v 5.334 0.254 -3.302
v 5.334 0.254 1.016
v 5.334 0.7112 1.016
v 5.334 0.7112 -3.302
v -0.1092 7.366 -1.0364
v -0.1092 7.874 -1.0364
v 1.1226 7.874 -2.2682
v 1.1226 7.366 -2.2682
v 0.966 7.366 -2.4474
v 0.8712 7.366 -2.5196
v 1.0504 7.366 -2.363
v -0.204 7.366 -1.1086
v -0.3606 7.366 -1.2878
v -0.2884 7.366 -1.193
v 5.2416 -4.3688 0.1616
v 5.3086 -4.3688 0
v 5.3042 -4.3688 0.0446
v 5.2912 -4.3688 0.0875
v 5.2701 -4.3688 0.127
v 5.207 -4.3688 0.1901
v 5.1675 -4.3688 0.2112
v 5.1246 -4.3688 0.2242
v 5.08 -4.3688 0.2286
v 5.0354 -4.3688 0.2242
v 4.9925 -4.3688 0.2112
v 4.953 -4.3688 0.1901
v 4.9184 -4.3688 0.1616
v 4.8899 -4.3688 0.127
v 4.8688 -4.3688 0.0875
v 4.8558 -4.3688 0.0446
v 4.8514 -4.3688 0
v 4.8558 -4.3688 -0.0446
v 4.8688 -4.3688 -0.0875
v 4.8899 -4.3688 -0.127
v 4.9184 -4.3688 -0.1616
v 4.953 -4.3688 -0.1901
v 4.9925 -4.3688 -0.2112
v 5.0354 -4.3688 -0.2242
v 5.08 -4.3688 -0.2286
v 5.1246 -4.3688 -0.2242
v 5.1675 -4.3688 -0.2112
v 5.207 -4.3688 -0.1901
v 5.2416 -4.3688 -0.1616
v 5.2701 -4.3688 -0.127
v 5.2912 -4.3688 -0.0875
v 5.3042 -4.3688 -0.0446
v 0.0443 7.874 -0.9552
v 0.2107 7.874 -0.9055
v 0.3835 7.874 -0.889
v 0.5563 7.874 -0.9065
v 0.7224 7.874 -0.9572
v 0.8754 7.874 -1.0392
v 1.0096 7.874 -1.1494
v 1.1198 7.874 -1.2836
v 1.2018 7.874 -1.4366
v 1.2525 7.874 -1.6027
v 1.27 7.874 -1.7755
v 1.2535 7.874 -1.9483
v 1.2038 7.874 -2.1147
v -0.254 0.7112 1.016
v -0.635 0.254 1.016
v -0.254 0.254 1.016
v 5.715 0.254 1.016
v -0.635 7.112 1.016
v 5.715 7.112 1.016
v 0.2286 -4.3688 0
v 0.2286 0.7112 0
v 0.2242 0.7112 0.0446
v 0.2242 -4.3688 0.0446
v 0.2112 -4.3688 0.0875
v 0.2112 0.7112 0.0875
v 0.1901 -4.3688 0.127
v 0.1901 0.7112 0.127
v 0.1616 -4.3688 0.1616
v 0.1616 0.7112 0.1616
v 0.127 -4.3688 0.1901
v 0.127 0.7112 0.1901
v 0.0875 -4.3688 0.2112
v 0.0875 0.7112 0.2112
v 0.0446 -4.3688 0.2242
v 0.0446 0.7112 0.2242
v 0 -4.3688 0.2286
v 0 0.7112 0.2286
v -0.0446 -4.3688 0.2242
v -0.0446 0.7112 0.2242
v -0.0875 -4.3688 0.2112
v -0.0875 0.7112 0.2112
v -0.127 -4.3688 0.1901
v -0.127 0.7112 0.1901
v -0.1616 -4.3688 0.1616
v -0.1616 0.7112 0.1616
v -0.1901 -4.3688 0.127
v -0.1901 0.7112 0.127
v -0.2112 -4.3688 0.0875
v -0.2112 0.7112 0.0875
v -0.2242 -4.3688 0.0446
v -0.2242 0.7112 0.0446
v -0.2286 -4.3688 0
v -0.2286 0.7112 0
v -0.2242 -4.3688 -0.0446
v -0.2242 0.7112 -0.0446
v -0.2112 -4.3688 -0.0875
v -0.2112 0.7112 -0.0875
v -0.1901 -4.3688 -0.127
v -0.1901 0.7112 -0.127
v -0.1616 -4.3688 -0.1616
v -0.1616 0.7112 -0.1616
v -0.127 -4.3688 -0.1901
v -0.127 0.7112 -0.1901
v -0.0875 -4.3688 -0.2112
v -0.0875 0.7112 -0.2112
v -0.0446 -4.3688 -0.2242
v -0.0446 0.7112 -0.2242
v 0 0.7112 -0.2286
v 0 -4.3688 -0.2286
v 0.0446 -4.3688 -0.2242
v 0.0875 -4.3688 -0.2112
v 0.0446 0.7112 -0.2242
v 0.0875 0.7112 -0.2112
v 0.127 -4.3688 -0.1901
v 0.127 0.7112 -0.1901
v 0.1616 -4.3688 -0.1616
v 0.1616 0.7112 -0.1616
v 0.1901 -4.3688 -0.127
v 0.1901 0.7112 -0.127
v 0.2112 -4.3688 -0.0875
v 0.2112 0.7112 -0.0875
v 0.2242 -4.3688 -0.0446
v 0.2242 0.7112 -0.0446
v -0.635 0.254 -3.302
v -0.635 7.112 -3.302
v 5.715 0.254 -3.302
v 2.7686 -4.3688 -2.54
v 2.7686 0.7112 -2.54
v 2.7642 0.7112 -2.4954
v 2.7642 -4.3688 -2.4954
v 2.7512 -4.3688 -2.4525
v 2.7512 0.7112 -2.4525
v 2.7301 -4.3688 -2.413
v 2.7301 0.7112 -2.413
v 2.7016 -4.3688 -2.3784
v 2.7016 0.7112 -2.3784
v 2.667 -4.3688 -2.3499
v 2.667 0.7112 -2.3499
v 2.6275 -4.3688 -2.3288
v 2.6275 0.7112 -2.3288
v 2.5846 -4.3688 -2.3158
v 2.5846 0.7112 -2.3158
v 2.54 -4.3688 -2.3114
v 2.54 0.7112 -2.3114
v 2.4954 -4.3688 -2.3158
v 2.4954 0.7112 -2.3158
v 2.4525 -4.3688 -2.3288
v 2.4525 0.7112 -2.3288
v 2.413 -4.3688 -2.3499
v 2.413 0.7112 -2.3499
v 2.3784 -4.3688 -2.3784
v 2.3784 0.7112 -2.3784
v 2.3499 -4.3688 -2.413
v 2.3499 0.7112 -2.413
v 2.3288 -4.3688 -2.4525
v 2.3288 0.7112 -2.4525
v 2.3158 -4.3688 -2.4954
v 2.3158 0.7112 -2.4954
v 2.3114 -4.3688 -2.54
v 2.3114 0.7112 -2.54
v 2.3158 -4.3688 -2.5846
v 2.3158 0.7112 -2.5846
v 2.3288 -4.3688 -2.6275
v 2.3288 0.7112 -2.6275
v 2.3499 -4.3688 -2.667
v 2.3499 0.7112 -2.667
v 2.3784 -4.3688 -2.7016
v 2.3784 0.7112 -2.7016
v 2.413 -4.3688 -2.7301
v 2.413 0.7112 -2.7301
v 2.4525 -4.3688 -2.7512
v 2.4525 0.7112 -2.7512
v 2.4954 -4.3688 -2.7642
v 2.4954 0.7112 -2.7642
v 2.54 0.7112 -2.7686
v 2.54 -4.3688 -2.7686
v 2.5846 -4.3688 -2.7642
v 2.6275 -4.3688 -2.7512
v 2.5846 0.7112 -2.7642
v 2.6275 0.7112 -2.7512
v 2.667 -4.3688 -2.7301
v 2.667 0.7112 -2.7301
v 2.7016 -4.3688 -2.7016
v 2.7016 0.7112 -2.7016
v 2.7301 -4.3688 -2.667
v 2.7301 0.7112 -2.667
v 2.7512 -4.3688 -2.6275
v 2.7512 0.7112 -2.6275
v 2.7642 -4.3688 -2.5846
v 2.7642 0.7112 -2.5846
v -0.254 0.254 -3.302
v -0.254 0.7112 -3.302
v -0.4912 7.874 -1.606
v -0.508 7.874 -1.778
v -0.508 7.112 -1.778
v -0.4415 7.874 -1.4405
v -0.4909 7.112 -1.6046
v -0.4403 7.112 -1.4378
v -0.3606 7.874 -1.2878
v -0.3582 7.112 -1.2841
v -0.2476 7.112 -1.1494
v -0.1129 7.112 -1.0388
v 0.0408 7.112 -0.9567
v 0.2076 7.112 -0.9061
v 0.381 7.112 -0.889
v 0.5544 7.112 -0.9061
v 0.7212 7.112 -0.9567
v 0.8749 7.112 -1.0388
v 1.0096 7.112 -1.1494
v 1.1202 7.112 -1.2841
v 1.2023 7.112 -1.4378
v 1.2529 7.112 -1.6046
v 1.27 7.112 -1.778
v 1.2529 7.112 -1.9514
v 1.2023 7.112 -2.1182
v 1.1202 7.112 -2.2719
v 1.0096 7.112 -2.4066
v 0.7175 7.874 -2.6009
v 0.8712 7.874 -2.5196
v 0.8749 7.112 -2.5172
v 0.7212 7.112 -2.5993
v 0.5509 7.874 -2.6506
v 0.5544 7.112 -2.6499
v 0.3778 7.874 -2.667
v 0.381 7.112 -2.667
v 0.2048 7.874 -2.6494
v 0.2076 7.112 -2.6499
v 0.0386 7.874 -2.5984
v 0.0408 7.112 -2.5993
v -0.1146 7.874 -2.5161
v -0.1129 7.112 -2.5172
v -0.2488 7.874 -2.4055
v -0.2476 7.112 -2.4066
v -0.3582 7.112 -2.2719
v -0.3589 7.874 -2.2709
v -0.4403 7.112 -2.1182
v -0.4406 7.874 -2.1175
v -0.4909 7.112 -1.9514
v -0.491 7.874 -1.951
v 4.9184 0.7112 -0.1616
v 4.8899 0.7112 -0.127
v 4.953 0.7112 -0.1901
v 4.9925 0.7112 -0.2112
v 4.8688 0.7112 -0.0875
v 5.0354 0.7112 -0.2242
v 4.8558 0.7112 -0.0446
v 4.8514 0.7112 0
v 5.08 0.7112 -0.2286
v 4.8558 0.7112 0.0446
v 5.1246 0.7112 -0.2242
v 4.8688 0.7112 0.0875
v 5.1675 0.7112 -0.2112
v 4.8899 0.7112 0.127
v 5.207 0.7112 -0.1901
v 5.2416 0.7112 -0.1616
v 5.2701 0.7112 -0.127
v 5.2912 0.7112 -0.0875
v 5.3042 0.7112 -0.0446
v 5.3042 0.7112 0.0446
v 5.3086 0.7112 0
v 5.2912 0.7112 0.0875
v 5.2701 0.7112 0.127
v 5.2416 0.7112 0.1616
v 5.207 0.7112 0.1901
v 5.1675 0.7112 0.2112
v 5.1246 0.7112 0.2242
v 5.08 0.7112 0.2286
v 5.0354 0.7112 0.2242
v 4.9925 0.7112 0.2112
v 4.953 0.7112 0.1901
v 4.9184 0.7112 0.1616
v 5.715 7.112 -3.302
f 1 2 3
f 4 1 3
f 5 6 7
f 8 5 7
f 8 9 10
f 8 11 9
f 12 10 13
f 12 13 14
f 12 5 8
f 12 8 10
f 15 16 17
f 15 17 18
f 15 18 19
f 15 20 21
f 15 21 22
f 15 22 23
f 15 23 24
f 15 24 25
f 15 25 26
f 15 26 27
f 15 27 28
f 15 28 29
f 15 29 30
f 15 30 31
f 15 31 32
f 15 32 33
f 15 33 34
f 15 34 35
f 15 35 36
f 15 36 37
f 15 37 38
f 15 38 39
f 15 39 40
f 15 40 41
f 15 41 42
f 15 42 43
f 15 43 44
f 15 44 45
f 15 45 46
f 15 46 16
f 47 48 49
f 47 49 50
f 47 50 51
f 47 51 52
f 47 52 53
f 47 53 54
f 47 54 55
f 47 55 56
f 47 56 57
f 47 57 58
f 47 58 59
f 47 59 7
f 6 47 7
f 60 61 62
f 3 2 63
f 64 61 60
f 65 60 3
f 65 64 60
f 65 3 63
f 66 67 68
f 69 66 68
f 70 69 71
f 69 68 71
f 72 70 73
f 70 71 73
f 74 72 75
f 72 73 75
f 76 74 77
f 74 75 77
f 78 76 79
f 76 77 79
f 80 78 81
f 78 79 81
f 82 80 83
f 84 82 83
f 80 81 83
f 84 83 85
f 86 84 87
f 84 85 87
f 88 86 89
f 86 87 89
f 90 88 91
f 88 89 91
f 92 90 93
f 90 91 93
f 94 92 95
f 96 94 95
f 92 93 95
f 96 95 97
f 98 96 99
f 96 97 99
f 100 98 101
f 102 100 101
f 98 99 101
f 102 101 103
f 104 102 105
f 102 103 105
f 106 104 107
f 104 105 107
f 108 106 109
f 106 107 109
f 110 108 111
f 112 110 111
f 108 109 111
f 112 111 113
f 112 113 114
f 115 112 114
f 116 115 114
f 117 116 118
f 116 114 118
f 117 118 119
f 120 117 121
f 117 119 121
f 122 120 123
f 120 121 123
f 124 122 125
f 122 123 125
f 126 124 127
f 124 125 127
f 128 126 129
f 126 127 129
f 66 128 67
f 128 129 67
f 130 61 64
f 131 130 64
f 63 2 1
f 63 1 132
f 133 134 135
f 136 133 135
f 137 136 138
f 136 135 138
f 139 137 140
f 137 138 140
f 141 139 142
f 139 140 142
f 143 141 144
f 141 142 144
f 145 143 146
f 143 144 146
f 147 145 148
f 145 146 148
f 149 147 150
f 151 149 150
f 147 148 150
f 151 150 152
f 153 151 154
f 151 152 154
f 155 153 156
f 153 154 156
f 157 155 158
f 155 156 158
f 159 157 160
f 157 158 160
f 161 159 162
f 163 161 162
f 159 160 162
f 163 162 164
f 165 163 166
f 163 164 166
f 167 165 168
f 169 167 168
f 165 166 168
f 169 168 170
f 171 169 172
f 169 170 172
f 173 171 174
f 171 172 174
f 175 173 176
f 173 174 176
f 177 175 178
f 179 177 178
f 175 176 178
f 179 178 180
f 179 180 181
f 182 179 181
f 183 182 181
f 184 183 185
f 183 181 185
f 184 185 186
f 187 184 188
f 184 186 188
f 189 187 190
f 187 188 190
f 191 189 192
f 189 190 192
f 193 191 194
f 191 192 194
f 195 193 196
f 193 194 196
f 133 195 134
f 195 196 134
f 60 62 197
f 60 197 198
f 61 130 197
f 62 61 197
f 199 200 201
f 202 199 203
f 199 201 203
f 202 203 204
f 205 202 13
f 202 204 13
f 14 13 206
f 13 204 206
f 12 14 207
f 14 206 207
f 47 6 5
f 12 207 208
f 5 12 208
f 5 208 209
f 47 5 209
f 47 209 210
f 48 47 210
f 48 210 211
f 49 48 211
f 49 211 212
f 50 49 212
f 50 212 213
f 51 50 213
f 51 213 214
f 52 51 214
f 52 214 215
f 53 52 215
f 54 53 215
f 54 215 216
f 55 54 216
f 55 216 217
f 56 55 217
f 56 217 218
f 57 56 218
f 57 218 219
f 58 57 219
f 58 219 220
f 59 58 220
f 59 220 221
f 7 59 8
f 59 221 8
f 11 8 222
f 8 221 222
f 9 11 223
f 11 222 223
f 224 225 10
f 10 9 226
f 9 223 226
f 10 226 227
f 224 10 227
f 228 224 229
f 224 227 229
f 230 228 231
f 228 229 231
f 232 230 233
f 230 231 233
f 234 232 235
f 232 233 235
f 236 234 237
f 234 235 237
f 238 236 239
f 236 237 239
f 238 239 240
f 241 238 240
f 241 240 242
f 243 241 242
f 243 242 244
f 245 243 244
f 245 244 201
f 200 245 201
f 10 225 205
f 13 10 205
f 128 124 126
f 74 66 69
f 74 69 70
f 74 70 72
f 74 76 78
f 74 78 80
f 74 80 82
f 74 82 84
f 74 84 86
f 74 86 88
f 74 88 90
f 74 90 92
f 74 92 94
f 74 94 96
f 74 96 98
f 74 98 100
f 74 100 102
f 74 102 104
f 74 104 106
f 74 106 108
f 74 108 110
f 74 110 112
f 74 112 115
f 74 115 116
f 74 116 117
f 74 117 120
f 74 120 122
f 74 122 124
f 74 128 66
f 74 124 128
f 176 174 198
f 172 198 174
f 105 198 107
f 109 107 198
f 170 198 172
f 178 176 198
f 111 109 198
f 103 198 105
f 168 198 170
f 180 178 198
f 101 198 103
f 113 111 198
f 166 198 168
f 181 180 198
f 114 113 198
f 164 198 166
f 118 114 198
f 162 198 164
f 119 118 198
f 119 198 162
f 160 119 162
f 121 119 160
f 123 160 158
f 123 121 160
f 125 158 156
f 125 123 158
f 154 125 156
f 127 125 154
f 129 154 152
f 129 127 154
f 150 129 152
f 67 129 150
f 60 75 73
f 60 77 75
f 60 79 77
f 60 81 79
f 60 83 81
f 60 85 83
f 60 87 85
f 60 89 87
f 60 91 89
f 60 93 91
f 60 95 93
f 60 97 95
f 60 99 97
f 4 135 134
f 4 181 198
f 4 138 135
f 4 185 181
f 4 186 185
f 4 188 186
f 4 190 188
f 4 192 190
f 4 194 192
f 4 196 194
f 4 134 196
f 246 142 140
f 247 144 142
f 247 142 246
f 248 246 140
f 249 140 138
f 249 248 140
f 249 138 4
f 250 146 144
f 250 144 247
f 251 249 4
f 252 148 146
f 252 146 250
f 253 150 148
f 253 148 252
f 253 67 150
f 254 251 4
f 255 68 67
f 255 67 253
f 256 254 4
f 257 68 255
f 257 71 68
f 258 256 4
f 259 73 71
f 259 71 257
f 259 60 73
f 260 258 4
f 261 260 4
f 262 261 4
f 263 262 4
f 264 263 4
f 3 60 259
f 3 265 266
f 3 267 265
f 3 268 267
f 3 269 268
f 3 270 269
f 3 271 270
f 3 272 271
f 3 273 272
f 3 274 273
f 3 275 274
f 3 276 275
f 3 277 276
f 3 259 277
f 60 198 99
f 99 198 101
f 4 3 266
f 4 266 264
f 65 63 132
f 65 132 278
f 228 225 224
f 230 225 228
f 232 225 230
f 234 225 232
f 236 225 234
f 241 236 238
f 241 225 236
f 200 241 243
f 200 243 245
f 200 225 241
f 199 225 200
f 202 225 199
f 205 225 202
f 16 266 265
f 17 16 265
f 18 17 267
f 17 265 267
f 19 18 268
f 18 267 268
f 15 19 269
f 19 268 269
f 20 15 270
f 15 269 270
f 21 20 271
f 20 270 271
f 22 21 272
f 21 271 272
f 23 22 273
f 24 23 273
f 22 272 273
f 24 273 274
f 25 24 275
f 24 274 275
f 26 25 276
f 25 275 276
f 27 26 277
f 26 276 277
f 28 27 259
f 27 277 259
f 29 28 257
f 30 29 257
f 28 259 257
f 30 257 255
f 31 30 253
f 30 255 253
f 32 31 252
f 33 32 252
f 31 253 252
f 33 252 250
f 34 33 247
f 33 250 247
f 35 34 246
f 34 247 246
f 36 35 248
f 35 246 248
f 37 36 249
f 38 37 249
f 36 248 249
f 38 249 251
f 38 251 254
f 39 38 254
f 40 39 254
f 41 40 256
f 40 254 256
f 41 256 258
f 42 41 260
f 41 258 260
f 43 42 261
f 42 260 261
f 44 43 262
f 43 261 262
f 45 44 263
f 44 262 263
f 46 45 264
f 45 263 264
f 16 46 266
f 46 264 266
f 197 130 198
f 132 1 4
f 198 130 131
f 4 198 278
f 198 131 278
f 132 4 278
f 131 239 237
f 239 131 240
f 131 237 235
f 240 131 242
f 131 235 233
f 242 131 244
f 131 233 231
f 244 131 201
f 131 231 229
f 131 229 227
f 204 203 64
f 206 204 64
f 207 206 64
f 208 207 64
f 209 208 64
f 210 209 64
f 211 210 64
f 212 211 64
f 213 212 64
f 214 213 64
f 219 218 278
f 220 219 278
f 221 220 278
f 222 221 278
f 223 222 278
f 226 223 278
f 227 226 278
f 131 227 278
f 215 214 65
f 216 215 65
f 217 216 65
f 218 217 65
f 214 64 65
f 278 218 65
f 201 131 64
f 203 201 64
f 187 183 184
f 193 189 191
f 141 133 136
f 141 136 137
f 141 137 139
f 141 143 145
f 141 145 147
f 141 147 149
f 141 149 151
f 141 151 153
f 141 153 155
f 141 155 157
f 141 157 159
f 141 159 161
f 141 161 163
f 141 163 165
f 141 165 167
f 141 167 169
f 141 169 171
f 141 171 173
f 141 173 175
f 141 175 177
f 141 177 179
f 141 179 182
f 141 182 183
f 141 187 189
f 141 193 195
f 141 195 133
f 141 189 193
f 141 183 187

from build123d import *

# Parameters (mm, degrees)
SKETCH3_W               = 6.35
SKETCH3_H               = 6.858
BASE_EXTRUDE_DEPTH      = 1.016
BASE_EXTRUDE_DEPTH_BACK = 3.302
SKETCH4_W               = 5.588
SKETCH4_H               = 0.4572
CUT_EXTRUDE1_DEPTH      = 5.318
SKETCH5_R               = 0.889
BOSS_EXTRUDE1_DEPTH     = 0.762
CUT_EXTRUDE2_DEPTH      = 0.508
SKETCH7_R               = 0.2286
BOSS_EXTRUDE2_DEPTH     = 5.08


with BuildPart() as part:
    # Sketch3 → Base-Extrude (new body, two sides)
    with BuildSketch(Plane.XY) as base_extrude_sk:
        with Locations((2.54, 3.683)):
            Rectangle(SKETCH3_W, SKETCH3_H)
    extrude(amount=BASE_EXTRUDE_DEPTH)
    extrude(base_extrude_sk.sketch, amount=-BASE_EXTRUDE_DEPTH_BACK)

    # Sketch4 → Cut-Extrude1 (cut, through all)
    with BuildSketch(Plane.XY.offset(1.016)):
        with Locations((2.54, 0.4826)):
            Rectangle(SKETCH4_W, SKETCH4_H)
    extrude(amount=-CUT_EXTRUDE1_DEPTH, mode=Mode.SUBTRACT)

    # Sketch5 → Boss-Extrude1 (add)
    with BuildSketch(Plane(origin=(0, 7.112, 0), x_dir=(-1, 0, 0), z_dir=(0, 1, 0))):
        with Locations((-0.381, -1.778)):
            Circle(SKETCH5_R)
    extrude(amount=BOSS_EXTRUDE1_DEPTH)

    # Sketch6 → Cut-Extrude2 (cut)
    with BuildSketch(Plane(origin=(0, 7.874, 0), x_dir=(-1, 0, 0), z_dir=(0, 1, 0))):
        Polygon((-1.153302026, -2.801749198), (0.642749198, -1.005697974), (0.391302026, -0.754250802), (-1.404749198, -2.550302026), align=None)
    extrude(amount=-CUT_EXTRUDE2_DEPTH, mode=Mode.SUBTRACT)

    # Sketch7 → Boss-Extrude2 (add)
    with BuildSketch(Plane.XZ.offset(-0.7112)):
        Circle(SKETCH7_R)
        with Locations((5.08, 0)):
            Circle(SKETCH7_R)
        with Locations((2.54, -2.54)):
            Circle(SKETCH7_R)
    extrude(amount=BOSS_EXTRUDE2_DEPTH)


solid = part.part
